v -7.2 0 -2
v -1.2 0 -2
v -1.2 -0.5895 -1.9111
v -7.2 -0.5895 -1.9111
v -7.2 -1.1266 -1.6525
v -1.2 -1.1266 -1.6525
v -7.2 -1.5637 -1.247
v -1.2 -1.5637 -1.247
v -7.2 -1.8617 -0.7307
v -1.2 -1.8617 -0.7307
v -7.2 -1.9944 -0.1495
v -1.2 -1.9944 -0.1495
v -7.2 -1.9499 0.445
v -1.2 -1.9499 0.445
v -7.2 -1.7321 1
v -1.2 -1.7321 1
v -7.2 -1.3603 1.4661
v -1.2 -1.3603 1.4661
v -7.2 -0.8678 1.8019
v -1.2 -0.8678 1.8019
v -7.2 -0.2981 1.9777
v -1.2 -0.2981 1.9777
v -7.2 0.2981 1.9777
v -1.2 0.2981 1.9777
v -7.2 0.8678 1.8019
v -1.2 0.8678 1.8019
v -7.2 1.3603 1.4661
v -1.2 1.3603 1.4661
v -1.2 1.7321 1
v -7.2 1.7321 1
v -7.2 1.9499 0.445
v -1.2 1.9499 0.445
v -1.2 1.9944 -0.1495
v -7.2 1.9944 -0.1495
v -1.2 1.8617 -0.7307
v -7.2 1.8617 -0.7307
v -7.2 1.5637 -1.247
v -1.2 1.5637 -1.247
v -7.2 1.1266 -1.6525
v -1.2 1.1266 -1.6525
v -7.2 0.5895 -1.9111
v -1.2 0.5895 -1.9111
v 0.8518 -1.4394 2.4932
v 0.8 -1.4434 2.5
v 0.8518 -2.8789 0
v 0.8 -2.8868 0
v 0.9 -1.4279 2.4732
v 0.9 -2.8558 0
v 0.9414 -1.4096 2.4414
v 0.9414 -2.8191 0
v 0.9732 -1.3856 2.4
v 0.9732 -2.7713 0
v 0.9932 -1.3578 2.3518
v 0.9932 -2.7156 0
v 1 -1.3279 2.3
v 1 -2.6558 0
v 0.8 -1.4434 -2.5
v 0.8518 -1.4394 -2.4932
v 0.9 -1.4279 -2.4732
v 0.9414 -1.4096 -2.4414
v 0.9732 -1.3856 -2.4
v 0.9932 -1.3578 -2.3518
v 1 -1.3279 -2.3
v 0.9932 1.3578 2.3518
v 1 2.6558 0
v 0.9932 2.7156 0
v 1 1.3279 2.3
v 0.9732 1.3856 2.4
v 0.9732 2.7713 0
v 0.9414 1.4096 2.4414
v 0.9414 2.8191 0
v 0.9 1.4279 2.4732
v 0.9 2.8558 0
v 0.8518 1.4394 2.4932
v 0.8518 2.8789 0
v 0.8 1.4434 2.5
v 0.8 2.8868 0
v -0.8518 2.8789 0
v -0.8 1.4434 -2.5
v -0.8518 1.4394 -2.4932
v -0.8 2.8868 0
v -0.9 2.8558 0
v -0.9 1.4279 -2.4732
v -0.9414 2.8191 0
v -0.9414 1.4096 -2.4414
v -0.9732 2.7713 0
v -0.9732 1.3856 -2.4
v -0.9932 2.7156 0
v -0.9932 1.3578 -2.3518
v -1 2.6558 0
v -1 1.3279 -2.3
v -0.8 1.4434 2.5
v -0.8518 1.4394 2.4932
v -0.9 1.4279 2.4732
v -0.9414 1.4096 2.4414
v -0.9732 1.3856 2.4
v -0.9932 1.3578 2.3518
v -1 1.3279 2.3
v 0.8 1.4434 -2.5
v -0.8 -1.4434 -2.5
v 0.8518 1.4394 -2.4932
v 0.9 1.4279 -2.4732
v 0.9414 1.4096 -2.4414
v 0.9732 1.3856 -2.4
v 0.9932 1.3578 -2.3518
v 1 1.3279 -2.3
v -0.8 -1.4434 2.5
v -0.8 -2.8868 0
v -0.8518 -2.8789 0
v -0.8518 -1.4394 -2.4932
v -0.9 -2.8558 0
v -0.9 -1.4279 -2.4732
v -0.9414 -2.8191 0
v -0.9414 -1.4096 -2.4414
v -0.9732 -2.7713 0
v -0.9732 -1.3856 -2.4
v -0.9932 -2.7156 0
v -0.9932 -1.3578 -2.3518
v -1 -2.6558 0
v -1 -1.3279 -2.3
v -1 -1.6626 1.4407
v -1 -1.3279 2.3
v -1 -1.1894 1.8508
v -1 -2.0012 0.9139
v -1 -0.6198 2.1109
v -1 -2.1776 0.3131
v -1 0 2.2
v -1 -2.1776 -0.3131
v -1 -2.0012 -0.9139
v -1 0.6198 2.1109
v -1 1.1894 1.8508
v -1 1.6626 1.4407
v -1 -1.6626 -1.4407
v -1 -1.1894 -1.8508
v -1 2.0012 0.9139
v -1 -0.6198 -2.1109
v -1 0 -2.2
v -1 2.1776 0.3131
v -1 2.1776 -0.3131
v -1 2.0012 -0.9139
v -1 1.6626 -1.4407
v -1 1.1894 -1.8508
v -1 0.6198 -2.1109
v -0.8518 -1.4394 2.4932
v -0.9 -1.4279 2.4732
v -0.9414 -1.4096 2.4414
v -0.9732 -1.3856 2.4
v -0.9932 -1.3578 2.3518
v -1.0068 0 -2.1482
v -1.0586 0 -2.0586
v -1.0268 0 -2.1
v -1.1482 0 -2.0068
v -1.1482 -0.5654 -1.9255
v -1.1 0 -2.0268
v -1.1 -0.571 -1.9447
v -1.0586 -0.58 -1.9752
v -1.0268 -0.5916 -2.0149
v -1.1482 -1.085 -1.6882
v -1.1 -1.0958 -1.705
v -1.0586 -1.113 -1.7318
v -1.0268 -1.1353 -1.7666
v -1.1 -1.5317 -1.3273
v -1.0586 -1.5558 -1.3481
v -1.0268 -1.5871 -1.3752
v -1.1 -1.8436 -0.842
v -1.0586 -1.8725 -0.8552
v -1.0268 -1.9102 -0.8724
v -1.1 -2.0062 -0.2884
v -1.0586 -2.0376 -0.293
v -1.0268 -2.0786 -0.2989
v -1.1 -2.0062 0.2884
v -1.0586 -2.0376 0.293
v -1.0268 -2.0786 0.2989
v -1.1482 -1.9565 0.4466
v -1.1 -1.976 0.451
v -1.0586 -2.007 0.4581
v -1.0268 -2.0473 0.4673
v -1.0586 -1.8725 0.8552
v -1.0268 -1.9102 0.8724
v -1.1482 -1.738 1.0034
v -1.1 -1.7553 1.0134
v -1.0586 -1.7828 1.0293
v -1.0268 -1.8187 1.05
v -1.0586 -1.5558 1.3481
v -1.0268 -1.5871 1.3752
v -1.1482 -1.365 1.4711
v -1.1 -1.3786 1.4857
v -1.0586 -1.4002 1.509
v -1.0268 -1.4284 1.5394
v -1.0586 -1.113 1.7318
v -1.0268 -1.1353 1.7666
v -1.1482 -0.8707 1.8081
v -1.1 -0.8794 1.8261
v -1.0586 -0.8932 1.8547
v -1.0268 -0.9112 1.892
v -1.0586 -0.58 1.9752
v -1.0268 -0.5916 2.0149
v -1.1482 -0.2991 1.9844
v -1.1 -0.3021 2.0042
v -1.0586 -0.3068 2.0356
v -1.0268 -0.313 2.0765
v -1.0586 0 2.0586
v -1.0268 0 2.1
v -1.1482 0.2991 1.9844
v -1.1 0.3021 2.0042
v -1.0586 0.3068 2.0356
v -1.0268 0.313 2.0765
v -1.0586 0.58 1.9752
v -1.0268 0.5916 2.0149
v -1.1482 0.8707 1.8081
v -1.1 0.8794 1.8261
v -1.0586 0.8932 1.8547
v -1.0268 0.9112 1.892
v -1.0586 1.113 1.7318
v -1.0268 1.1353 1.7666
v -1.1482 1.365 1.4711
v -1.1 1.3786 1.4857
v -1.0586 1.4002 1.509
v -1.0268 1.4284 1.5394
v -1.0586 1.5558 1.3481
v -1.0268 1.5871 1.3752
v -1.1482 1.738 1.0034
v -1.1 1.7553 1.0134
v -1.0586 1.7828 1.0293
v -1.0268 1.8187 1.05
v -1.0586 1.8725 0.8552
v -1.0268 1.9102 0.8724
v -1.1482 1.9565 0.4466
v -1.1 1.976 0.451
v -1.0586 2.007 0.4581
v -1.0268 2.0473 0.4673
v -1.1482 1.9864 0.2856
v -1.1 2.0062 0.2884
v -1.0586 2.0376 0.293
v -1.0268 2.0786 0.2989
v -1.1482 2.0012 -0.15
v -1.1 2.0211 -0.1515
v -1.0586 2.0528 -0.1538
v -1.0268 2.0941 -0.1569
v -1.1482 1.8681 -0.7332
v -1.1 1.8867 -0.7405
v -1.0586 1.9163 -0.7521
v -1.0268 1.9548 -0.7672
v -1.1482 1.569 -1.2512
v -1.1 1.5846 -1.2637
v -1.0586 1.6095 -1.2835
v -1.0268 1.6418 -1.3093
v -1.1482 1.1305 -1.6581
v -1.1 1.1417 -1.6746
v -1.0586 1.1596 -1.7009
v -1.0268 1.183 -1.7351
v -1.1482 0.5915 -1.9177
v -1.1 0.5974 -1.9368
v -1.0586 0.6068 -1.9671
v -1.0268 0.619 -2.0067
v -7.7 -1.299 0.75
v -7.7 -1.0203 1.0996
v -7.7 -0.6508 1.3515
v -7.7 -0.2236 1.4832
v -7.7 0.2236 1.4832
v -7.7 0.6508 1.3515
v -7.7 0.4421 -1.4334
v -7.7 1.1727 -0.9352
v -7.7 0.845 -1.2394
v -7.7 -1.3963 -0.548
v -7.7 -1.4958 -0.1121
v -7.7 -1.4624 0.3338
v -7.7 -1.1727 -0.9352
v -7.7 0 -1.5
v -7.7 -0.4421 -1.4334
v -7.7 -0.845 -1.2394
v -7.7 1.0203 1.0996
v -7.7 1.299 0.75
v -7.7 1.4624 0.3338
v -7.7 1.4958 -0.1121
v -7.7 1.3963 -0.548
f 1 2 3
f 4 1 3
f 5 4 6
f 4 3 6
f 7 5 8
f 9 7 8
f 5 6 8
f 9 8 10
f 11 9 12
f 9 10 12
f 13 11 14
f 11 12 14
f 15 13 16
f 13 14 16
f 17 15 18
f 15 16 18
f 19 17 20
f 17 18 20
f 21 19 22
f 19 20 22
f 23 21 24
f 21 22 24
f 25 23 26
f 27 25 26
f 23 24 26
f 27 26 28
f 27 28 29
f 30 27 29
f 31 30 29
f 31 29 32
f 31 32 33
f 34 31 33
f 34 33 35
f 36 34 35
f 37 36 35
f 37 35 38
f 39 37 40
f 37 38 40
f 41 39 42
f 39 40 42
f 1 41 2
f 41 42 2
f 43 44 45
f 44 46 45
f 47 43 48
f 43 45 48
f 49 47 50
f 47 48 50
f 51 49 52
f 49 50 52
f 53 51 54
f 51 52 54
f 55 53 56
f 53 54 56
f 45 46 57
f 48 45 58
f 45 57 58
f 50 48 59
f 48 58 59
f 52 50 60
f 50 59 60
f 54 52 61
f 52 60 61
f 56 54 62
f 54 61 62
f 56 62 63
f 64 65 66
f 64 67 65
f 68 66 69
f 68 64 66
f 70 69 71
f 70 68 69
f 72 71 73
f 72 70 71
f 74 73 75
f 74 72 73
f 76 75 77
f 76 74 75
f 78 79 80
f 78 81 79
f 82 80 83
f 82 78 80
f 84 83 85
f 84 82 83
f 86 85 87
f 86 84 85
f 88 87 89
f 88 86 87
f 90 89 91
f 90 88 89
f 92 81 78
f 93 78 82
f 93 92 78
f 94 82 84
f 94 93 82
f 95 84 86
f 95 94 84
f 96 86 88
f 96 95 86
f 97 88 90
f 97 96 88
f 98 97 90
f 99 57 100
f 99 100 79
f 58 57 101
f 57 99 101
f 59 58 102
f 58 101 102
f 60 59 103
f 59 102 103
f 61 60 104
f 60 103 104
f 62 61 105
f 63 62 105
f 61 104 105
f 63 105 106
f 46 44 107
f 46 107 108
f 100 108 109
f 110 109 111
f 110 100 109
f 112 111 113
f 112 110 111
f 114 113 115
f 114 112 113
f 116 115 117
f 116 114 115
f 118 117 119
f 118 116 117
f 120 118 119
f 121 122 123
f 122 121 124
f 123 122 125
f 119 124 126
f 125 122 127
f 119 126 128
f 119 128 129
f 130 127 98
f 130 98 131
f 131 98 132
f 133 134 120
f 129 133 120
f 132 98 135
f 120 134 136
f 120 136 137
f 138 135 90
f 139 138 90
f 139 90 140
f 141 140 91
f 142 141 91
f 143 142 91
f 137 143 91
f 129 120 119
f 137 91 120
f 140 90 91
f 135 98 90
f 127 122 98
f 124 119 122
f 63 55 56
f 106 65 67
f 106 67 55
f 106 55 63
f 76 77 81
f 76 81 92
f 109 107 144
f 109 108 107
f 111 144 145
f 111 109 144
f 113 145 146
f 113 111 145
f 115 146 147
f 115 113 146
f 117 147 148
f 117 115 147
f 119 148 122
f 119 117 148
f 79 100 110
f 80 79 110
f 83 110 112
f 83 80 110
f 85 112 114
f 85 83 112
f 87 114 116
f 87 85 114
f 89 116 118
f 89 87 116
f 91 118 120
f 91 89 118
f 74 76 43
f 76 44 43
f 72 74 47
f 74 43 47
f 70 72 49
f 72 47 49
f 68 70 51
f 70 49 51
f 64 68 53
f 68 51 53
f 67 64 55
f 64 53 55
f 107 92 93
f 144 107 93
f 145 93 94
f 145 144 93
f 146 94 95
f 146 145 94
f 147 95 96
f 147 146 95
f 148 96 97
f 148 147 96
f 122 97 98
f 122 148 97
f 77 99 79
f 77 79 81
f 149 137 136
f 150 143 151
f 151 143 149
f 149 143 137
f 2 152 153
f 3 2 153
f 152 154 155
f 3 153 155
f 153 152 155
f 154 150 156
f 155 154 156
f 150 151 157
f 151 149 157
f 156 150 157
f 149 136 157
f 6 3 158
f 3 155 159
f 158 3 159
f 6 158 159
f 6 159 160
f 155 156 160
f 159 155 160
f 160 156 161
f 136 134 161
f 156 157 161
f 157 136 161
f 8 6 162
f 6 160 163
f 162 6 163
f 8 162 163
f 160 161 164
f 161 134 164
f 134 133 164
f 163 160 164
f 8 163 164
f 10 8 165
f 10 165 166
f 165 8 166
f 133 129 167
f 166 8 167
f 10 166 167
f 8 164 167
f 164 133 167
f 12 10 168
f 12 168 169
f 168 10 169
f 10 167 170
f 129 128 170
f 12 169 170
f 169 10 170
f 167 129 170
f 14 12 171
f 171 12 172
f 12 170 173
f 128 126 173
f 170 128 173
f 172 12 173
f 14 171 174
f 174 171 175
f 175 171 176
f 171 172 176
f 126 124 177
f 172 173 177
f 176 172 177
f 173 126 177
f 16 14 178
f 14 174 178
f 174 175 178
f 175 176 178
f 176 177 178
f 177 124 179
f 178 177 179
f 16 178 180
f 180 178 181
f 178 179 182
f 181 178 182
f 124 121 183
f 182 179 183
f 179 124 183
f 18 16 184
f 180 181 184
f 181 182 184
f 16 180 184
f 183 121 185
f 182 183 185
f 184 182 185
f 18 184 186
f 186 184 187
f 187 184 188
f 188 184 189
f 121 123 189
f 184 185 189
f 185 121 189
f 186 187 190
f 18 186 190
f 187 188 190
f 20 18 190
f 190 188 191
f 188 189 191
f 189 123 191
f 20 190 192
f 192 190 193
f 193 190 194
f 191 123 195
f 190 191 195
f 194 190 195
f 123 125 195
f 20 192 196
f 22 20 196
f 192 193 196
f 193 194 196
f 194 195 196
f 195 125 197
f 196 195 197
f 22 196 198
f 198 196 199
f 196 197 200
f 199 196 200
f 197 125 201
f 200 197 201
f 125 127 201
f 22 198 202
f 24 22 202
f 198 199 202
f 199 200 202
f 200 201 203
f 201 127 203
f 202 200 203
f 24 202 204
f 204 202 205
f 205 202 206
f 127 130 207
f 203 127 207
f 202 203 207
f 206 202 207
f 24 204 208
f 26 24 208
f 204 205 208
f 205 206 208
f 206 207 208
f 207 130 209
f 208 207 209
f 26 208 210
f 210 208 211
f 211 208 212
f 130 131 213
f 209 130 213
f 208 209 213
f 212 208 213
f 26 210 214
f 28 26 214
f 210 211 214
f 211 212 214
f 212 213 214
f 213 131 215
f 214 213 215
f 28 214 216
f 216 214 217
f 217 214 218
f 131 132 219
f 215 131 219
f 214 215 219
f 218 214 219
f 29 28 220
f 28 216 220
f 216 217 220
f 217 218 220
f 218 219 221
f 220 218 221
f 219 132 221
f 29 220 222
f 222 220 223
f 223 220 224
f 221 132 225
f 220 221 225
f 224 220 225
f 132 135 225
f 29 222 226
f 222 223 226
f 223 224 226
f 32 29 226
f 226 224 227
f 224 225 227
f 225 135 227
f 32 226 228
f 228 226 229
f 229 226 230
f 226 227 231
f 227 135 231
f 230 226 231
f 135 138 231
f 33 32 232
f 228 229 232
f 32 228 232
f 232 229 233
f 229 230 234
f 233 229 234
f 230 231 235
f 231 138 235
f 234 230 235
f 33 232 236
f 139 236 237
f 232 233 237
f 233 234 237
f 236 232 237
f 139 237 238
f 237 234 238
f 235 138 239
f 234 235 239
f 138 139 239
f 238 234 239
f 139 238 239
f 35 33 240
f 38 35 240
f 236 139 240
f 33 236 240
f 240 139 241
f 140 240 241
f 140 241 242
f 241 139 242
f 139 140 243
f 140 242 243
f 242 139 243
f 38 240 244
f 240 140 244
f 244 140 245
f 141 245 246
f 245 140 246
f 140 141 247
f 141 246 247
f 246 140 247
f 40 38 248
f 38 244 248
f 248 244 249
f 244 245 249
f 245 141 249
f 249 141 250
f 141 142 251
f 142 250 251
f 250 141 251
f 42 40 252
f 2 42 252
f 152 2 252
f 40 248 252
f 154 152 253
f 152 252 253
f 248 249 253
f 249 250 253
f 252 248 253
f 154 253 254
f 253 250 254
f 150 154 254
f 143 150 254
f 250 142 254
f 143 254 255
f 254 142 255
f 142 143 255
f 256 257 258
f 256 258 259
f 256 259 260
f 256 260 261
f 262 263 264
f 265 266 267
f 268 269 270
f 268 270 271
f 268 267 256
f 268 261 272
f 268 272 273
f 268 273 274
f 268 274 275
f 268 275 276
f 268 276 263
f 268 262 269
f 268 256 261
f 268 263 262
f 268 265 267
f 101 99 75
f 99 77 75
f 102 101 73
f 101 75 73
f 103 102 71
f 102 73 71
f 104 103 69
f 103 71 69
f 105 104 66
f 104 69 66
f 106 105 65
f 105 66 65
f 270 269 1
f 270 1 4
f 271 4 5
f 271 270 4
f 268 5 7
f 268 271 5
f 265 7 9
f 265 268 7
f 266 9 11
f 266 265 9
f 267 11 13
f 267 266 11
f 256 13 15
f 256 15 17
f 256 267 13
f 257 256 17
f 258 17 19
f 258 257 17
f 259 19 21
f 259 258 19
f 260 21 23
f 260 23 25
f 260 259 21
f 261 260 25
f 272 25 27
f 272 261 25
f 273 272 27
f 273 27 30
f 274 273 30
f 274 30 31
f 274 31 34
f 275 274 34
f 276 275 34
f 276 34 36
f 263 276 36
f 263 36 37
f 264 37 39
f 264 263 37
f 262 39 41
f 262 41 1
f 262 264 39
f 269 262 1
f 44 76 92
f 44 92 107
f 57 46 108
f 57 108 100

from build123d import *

# Parameters (mm, degrees)
BOSS_EXTRUDE1_DEPTH = 1
FILLET1_R           = 0.2
SKETCH2_R           = 2
BOSS_EXTRUDE2_DEPTH = 6.7
CHAMFER1_SIZE       = 0.5
FILLET2_R           = 0.2


with BuildPart() as part:
    # Sketch1 → Boss-Extrude1 (new, symmetric)
    with BuildSketch(Plane(origin=(0, 0, 0), x_dir=(0, 0, -1), z_dir=(1, 0, 0))):
        Polygon((2.5, 1.443375673), (0, 2.886751346), (-2.5, 1.443375673), (-2.5, -1.443375673), (0, -2.886751346), (2.5, -1.443375673), align=None)
    extrude(amount=BOSS_EXTRUDE1_DEPTH, both=True)

    # Fillet1
    fillet1_edges = [part.edges().sort_by_distance(p)[0] for p in [
        (1, 2.165063509, 1.25),
        (1, 0, 2.5),
        (1, -2.165063509, 1.25),
        (1, -2.165063509, -1.25),
        (1, 0, -2.5),
        (-1, -2.165063509, -1.25),
        (-1, -2.165063509, 1.25),
        (-1, 0, 2.5),
        (-1, 2.165063509, 1.25),
        (-1, 2.165063509, -1.25),
        (-1, 0, -2.5),
        (1, 2.165063509, -1.25),
    ]]
    fillet(fillet1_edges, radius=FILLET1_R)

    # Sketch2 → Boss-Extrude2 (add)
    with BuildSketch(Plane.ZY.offset(1)):
        with Locations(Location((0, 0, 0), (0, 0, 180))):
            Circle(SKETCH2_R)
    extrude(amount=BOSS_EXTRUDE2_DEPTH)

    # Chamfer1
    chamfer1_edges = [part.edges().sort_by_distance(p)[0] for p in [
        (-7.7, 0, 2),
    ]]
    chamfer(chamfer1_edges, length=CHAMFER1_SIZE)

    # Fillet2
    fillet2_edges = [part.edges().sort_by_distance(p)[0] for p in [
        (-1, 0, 2),
    ]]
    fillet(fillet2_edges, radius=FILLET2_R)


solid = part.part
